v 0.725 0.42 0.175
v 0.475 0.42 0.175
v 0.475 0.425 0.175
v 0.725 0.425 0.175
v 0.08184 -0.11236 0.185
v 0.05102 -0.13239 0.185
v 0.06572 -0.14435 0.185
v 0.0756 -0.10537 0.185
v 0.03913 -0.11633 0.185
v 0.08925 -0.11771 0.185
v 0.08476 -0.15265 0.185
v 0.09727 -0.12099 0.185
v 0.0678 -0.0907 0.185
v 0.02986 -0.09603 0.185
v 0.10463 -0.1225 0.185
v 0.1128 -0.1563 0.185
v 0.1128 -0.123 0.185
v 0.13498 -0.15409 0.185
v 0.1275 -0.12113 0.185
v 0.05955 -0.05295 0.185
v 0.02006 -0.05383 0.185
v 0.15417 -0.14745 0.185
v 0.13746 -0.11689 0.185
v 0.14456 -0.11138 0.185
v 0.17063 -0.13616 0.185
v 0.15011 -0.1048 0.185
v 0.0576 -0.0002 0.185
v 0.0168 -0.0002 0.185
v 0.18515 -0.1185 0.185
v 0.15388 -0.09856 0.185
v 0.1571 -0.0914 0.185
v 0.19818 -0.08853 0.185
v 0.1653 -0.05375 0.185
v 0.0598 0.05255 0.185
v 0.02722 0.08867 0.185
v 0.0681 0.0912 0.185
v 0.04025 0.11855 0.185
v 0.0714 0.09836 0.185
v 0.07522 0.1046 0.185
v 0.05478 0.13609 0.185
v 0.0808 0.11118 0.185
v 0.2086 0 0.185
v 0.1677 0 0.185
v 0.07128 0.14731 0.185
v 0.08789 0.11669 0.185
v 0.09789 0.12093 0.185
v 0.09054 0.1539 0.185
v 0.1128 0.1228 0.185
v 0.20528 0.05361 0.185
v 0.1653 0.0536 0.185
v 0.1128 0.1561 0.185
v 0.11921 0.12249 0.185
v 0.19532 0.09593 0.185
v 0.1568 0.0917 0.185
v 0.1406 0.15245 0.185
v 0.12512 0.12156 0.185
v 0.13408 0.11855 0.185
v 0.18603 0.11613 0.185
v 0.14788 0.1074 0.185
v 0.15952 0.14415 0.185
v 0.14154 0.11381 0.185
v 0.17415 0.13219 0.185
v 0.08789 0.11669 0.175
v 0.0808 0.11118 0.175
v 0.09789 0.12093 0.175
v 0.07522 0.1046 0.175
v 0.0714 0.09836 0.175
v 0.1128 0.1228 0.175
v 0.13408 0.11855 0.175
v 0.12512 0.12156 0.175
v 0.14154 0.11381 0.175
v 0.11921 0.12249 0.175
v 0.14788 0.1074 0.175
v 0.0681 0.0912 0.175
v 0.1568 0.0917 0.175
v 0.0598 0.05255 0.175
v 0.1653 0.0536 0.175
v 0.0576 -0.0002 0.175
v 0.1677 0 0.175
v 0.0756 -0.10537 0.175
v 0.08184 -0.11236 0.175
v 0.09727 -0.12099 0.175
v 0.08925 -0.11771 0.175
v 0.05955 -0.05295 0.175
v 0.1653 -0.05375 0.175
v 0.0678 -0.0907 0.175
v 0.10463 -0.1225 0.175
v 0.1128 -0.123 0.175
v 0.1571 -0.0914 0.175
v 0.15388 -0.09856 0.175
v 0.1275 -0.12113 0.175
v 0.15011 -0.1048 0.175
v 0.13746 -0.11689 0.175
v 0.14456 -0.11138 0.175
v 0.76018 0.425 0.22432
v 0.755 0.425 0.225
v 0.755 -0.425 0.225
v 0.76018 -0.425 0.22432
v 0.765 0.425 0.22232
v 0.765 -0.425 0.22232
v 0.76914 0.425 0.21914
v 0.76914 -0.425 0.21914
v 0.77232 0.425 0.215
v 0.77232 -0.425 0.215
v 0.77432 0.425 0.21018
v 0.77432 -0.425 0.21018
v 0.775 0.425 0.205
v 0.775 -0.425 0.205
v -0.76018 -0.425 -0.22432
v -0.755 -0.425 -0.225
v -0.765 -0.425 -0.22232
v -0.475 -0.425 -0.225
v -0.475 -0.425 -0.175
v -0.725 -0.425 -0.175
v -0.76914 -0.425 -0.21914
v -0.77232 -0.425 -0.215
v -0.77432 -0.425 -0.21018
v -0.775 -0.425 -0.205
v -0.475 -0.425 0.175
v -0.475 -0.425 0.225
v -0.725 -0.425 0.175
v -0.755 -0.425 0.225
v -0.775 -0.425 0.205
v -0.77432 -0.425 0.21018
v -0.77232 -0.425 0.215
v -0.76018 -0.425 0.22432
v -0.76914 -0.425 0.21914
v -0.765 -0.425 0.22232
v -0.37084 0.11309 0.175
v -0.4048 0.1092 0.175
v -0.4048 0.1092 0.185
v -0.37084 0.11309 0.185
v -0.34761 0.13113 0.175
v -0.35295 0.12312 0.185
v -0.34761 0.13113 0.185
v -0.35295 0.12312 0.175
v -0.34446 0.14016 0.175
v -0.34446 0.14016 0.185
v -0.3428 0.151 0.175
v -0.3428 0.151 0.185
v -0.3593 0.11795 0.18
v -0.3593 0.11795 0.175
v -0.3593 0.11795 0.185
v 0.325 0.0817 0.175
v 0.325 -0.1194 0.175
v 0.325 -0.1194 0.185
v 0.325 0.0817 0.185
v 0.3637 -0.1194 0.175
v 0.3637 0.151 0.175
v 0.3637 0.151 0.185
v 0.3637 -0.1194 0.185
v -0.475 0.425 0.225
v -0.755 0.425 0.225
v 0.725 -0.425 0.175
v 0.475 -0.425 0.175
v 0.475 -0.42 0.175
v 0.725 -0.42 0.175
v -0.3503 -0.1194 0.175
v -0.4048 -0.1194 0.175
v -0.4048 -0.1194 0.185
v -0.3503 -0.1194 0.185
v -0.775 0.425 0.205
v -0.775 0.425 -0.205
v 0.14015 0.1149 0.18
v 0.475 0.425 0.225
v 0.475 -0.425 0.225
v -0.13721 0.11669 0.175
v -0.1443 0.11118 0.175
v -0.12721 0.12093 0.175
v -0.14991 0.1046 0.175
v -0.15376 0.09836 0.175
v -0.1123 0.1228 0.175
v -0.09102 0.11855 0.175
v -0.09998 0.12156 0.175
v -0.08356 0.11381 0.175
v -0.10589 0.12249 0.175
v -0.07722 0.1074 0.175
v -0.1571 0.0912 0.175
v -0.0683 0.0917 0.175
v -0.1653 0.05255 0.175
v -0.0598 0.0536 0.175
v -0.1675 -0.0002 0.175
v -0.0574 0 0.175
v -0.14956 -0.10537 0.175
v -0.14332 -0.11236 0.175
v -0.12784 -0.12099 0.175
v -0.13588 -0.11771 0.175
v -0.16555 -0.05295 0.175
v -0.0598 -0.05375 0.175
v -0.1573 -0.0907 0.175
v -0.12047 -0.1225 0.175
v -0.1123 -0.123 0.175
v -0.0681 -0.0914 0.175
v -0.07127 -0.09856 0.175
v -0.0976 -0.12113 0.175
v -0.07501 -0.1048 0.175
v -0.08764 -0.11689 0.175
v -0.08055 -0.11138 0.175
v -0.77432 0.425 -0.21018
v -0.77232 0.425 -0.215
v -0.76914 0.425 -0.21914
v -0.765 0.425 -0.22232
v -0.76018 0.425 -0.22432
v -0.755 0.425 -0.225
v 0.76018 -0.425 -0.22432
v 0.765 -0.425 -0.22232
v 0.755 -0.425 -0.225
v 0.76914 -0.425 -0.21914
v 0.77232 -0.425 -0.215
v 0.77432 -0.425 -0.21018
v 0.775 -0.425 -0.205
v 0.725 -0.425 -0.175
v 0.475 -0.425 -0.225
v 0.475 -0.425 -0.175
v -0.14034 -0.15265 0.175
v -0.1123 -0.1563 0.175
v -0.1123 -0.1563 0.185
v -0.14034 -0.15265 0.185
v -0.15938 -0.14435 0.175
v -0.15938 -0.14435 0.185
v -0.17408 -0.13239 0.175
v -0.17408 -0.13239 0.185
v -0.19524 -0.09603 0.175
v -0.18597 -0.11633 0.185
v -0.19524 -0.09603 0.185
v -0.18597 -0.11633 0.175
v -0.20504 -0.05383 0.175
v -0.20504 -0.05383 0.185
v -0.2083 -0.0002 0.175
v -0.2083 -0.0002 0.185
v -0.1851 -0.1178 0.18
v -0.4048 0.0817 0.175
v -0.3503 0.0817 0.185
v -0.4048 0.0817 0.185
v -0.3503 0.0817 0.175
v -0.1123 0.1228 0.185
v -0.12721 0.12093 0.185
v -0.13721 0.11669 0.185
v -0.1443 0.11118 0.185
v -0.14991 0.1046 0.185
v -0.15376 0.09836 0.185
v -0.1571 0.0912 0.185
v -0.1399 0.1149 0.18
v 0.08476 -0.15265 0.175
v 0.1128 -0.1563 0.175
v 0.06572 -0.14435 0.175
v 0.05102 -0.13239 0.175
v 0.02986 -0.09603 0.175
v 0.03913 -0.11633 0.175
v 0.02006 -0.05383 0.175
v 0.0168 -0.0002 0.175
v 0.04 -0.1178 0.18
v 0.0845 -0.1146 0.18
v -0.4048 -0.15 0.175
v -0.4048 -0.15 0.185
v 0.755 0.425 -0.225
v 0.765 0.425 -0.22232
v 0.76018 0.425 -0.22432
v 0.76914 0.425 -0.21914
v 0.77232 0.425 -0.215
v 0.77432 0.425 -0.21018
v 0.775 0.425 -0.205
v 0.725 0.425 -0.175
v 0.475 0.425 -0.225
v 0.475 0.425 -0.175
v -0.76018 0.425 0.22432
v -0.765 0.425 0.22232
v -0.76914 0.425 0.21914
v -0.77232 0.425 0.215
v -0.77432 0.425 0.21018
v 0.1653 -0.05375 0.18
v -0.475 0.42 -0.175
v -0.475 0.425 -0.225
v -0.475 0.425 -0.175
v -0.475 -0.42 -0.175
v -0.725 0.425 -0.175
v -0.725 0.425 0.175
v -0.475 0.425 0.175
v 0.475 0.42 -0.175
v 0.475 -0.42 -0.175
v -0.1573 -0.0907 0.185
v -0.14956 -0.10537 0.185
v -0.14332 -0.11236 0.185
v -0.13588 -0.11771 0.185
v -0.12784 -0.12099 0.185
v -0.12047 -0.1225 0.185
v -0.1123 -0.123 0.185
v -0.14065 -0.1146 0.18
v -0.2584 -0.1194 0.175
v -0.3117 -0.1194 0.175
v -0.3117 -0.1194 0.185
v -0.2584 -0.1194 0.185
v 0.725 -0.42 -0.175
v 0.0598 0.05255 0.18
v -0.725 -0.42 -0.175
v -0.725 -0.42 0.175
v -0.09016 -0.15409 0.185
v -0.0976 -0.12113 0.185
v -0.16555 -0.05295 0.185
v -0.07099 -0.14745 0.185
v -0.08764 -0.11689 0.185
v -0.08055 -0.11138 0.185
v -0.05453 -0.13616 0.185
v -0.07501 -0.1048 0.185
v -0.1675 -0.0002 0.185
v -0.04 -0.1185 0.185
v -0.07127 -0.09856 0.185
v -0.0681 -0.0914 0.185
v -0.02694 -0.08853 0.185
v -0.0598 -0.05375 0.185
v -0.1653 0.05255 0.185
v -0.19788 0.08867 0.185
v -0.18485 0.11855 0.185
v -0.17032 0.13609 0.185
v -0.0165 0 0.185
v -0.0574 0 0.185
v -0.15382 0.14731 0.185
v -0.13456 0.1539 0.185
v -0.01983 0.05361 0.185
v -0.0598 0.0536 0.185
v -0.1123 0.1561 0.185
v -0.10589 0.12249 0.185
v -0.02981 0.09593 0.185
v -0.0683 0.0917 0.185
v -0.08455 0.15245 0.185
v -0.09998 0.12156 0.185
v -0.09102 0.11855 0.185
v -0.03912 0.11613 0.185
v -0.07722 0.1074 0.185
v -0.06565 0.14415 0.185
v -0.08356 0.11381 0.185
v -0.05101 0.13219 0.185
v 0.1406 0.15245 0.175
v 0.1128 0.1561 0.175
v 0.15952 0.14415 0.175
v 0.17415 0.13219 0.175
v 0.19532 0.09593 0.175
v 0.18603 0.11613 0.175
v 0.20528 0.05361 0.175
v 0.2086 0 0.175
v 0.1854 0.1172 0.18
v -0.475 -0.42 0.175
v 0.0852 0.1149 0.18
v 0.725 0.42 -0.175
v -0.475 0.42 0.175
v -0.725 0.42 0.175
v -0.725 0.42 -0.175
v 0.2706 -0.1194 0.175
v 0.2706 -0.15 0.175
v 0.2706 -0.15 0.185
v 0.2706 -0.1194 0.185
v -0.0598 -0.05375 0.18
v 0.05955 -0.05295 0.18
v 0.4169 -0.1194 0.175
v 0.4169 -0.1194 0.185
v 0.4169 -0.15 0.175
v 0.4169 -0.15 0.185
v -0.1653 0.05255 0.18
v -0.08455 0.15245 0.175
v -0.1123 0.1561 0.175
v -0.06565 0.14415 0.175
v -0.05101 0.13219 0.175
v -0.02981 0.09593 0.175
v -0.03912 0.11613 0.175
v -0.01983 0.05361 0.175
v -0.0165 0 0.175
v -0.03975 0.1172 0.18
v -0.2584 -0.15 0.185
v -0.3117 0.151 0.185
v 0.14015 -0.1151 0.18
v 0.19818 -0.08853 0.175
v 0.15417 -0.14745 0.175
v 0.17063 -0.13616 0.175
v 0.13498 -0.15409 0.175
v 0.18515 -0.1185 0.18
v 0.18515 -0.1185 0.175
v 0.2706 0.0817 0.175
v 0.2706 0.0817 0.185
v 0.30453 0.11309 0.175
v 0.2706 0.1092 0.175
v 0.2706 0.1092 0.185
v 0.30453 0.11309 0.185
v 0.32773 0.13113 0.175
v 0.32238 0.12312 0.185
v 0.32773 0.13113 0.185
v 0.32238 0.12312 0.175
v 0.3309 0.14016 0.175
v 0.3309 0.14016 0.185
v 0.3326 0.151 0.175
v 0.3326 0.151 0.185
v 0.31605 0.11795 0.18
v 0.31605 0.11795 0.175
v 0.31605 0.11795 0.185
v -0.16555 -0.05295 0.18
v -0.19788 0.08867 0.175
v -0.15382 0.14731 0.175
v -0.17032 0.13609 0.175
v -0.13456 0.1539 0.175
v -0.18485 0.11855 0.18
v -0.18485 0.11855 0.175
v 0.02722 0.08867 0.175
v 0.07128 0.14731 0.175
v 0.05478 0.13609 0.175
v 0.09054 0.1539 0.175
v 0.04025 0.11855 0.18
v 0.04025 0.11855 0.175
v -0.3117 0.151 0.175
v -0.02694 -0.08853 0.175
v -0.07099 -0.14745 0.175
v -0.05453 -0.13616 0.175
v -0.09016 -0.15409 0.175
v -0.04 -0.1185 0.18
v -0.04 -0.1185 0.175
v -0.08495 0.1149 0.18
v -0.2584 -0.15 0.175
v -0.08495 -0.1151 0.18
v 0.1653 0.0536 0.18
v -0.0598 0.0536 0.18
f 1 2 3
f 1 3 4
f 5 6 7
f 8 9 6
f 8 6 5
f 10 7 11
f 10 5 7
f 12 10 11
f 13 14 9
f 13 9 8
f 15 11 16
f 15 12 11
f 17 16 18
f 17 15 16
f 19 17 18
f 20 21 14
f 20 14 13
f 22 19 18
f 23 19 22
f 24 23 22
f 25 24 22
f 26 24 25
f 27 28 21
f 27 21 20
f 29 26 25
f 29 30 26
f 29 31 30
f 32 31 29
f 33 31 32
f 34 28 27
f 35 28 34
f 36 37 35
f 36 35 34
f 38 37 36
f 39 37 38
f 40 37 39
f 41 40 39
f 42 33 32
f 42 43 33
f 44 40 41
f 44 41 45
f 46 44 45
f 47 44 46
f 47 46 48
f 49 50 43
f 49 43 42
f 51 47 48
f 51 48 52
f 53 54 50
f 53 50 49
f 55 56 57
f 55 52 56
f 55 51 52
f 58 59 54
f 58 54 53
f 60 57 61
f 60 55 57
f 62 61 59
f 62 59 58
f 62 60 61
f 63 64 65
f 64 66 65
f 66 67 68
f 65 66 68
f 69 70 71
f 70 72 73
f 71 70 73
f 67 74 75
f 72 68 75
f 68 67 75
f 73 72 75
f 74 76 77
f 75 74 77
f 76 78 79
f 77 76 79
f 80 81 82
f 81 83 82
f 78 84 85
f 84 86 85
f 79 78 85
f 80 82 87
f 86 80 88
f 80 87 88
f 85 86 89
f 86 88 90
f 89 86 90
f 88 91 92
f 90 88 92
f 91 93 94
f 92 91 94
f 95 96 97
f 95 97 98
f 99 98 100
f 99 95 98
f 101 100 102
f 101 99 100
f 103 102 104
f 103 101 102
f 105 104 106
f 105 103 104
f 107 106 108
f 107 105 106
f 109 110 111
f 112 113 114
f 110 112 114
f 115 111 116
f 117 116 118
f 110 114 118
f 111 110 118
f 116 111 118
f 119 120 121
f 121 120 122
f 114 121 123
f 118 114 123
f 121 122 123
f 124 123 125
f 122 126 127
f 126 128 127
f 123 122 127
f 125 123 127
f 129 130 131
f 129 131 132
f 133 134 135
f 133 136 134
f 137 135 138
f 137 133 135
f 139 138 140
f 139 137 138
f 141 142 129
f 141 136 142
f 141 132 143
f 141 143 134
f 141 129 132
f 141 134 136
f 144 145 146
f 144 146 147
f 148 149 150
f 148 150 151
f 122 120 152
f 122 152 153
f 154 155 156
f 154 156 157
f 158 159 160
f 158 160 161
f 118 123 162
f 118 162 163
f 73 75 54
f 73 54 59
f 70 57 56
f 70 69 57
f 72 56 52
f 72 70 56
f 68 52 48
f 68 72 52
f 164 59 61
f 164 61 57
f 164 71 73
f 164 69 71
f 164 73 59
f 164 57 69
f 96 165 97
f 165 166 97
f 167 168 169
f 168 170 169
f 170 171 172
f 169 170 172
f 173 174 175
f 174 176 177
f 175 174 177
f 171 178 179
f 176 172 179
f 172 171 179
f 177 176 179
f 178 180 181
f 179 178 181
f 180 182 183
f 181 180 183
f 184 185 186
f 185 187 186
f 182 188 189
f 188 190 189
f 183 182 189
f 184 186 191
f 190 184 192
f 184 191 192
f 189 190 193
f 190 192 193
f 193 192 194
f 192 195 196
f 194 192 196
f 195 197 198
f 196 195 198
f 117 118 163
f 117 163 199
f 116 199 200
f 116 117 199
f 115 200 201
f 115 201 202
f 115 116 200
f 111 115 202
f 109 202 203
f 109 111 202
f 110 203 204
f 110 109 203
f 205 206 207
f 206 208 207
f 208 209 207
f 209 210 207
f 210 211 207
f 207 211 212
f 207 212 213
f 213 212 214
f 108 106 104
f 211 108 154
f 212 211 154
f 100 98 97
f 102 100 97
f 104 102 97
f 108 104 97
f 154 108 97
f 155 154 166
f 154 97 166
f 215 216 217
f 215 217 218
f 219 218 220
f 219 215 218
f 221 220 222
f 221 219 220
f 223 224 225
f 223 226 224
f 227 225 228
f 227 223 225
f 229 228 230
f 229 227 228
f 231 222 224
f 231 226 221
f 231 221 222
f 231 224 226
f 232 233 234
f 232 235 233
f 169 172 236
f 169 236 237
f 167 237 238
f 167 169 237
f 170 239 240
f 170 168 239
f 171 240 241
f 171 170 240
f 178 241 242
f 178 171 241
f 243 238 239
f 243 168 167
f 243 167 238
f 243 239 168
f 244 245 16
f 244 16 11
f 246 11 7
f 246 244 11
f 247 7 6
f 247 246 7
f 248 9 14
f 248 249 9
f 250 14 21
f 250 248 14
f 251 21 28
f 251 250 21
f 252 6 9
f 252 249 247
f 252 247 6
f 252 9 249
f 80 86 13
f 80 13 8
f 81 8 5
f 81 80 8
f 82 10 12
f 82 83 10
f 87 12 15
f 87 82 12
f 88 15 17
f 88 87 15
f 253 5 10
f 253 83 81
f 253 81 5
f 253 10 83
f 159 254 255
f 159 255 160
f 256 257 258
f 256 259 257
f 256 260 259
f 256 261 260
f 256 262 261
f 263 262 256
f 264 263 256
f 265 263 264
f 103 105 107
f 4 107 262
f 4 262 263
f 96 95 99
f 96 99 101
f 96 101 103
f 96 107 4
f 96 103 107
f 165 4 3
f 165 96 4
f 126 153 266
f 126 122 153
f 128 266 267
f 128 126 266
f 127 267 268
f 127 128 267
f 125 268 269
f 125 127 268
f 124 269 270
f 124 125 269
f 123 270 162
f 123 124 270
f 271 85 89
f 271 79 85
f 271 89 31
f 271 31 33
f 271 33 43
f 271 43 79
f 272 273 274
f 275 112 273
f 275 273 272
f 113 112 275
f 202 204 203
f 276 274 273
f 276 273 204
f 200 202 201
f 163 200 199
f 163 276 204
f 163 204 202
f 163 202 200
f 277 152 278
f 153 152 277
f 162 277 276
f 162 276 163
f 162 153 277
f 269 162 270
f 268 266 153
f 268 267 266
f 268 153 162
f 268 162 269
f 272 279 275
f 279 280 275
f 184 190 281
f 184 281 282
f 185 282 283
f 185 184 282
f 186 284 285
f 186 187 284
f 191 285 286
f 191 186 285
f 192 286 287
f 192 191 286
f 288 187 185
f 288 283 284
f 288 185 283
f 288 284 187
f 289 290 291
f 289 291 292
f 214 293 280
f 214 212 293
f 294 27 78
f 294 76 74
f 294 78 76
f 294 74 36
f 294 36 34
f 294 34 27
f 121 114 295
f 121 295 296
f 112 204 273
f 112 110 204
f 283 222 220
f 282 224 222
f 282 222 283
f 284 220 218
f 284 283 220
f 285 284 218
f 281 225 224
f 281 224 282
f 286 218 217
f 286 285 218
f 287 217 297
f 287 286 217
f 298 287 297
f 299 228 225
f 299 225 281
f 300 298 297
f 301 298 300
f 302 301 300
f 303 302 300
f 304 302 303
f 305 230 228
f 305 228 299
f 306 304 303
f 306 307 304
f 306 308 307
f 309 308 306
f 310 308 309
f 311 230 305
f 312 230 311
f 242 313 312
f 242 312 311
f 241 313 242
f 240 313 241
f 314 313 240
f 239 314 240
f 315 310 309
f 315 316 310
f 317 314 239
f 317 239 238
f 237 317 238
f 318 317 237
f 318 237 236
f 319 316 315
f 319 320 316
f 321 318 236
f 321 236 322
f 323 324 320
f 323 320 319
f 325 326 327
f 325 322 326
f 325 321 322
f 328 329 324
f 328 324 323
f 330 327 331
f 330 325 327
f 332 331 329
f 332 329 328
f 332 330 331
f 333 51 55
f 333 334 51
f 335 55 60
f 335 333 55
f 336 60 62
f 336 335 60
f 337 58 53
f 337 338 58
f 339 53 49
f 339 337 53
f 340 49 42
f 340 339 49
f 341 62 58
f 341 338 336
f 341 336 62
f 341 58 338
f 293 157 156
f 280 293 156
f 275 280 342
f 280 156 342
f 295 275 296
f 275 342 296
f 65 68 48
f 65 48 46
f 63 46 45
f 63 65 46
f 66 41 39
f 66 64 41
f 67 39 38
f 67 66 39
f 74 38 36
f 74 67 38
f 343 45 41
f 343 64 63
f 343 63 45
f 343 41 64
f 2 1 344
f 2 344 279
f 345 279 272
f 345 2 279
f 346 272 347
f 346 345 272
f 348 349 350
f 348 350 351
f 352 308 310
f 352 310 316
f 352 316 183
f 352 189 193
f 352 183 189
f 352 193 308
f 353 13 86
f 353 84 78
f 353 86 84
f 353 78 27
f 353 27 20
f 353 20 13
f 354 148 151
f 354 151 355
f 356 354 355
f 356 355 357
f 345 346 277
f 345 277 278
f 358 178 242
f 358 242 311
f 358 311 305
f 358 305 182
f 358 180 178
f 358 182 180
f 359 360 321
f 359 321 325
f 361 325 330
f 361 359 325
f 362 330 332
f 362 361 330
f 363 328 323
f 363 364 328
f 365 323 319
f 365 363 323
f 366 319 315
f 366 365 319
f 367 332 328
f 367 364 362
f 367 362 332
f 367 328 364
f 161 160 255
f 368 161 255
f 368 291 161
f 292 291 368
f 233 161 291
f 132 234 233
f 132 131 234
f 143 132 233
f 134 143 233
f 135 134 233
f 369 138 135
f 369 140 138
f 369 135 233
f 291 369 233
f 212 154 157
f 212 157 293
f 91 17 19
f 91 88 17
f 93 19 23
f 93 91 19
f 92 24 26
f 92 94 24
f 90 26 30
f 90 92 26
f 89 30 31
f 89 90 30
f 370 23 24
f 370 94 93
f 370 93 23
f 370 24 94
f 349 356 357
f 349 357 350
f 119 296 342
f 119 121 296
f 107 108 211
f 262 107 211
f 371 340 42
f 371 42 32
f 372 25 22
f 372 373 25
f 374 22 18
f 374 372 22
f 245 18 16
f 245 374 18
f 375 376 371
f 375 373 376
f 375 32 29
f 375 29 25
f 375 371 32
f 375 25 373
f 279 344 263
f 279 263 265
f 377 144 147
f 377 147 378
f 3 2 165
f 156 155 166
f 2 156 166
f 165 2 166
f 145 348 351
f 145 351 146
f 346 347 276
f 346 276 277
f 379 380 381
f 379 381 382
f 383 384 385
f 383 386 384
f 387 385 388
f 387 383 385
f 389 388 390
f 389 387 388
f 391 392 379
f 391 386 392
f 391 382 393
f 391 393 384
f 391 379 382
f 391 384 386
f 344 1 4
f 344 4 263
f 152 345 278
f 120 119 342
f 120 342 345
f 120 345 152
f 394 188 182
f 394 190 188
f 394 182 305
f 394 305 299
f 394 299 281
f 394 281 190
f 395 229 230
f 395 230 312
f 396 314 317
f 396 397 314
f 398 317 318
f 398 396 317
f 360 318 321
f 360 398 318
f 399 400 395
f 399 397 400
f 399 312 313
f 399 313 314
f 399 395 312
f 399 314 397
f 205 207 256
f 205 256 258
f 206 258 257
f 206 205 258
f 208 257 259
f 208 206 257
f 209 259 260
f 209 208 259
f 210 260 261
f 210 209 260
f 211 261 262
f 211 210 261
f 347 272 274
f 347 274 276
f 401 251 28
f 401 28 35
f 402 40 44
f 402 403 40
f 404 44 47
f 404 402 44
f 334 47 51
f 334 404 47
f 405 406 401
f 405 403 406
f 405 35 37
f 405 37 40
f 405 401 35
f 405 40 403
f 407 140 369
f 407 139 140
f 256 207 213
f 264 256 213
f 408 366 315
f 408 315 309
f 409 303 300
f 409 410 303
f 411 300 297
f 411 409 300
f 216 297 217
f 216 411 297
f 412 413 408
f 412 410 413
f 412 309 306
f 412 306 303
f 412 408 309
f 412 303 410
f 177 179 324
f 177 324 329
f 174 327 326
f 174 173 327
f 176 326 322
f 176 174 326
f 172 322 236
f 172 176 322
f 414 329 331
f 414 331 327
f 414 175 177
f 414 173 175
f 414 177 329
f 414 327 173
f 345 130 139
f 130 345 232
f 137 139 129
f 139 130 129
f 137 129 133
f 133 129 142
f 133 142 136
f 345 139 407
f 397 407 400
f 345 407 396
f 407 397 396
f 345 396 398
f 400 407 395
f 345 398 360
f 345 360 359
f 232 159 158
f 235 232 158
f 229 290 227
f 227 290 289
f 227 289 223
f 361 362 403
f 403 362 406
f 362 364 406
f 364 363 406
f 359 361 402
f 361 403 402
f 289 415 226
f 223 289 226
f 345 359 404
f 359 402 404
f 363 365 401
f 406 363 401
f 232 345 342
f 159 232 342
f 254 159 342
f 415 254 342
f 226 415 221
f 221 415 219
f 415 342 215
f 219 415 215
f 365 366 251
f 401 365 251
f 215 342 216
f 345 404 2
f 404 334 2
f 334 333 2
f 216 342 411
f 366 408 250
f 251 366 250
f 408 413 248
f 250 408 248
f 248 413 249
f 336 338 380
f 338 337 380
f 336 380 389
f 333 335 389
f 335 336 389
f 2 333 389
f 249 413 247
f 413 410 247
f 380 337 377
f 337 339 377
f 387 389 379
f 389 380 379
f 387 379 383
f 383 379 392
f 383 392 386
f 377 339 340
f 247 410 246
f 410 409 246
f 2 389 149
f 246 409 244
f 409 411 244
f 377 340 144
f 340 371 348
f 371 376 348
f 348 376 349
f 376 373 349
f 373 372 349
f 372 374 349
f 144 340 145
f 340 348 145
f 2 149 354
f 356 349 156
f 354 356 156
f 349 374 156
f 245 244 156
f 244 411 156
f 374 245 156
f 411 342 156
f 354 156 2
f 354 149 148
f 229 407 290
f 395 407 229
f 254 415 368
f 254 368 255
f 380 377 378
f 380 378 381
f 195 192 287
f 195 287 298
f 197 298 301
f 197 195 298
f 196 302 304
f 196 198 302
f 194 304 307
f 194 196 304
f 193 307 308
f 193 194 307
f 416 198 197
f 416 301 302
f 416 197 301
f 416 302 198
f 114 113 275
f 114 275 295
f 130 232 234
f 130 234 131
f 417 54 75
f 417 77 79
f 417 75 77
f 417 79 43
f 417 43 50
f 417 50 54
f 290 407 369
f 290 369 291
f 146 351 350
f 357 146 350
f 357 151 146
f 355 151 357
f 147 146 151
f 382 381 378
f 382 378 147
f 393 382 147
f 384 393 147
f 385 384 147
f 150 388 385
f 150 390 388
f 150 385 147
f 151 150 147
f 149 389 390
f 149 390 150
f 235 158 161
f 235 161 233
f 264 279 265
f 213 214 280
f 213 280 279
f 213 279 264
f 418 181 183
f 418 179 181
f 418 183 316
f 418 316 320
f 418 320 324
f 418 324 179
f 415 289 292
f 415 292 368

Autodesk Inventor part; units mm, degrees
ref_plane "YZ Plane" through (0, 0, 0) normal (1, 0, 0) x (0, 1, 0)
ref_plane "XZ Plane" through (0, 0, 0) normal (0, 1, 0) x (-1, 0, 0)
ref_plane "XY Plane" through (0, 0, 0) normal (0, 0, 1) x (1, 0, 0)
sketch "Sketch1" plane through (0, 0, 0) normal (0, 1, 0) x (-1, 0, 0)
  line L0 (0.725, 0.175) -> (-0.725, 0.175)
  line L1 (-0.725, 0.175) -> (-0.725, -0.175)
  line L2 (-0.725, -0.175) -> (0.725, -0.175)
  line L3 (0.725, -0.175) -> (0.725, 0.175)
  line L4 (0.475, 0.175) -> (0.475, 0.225)
  line L5 (0.475, 0.225) -> (0.775, 0.225)
  line L6 (0.775, 0.225) -> (0.775, -0.225)
  line L7 (0.775, -0.225) -> (0.475, -0.225)
  line L8 (0.475, -0.225) -> (0.475, -0.175)
  line L9 (-0.475, 0.175) -> (-0.475, 0.225)
  line L10 (-0.475, 0.225) -> (-0.775, 0.225)
  line L11 (-0.775, 0.225) -> (-0.775, -0.225)
  line L12 (-0.775, -0.225) -> (-0.475, -0.225)
  line L13 (-0.475, -0.175) -> (-0.475, -0.225)
  line L14 (0.475, 0.175) -> (-0.475, 0.175)
  point P0 (0, 0)
  point P1 (0, 0.175)
  point P2 (0.725, 0)
  dimension "d0" = 1.55
  dimension "d1" = 0.05
  dimension "d2" = 0.05
  dimension "d3" = 0.45
  dimension "d4" = 0.3
extrude "Extrusion1" add sketch "Sketch1" along normal mid plane 0.85 contours L0 L4 L5 L6 L7 L8 L2 L3 | L0 L1 L2 L13 L12 L11 L10 L9
extrude "Extrusion2" add sketch "Sketch1" along normal mid plane 0.84 contours L3 L2 L1 L0
sketch "Sketch2" plane through (-0.475, -0.42, 0.175) normal (0, 0, 1) x (1, 0, 0)
  line L0 (0, 0) -> (0, 0.84) projected
  line L1 (0.95, 0) -> (0, 0) projected
  line L2 (0.95, 0) -> (0.95, 0.84) projected
  line L3 (0, 0.84) -> (0.95, 0.84) projected
  line L4 (0, 0.42) -> (0.95, 0.42) construction
  line L5 (0.2166, 0.27) -> (0.0702, 0.27)
  line L6 (0.0702, 0.27) -> (0.0702, 0.3006)
  line L7 (0.0702, 0.3006) -> (0.1247, 0.3006)
  line L8 (0.1247, 0.3006) -> (0.1247, 0.5017)
  line L9 (0.1247, 0.5017) -> (0.0702, 0.5017)
  line L10 (0.0702, 0.5017) -> (0.0702, 0.5292)
  spline S0 degree 2 poles (0.0702, 0.5292) (0.1011, 0.5292) (0.1303, 0.5467) (0.1322, 0.571) knots 0 0 0 1 2 2 2
  line L11 (0.1322, 0.571) -> (0.1633, 0.571)
  line L12 (0.1633, 0.571) -> (0.1633, 0.3006)
  line L13 (0.1633, 0.3006) -> (0.2166, 0.3006)
  line L14 (0.2166, 0.3006) -> (0.2166, 0.27)
  spline S1 degree 2 poles (0.4585, 0.42) (0.4585, 0.3393) (0.4115, 0.2637) (0.3627, 0.2637) knots 0 0 0 1 2 2 2
  spline S2 degree 2 poles (0.3627, 0.2637) (0.3131, 0.2637) (0.2667, 0.3407) (0.2667, 0.4198) knots 0 0 0 1 2 2 2
  spline S3 degree 2 poles (0.2667, 0.4198) (0.2667, 0.501) (0.3136, 0.5761) (0.3627, 0.5761) knots 0 0 0 1 2 2 2
  spline S4 degree 2 poles (0.3627, 0.5761) (0.412, 0.5761) (0.4585, 0.4983) (0.4585, 0.42) knots 0 0 0 1 2 2 2
  spline S5 degree 2 poles (0.4069, 0.3286) (0.4128, 0.3434) (0.4176, 0.3891) (0.4176, 0.42) knots 0 0 0 1 2 2 2
  spline S6 degree 2 poles (0.4176, 0.42) (0.4176, 0.4509) (0.4128, 0.4963) (0.4067, 0.5117) knots 0 0 0 1 2 2 2
  spline S7 degree 2 poles (0.4067, 0.5117) (0.4006, 0.527) (0.3795, 0.5428) (0.3627, 0.5428) knots 0 0 0 1 2 2 2
  spline S8 degree 2 poles (0.3627, 0.5428) (0.3459, 0.5428) (0.3243, 0.527) (0.3179, 0.5112) knots 0 0 0 1 2 2 2
  spline S9 degree 2 poles (0.3179, 0.5112) (0.3119, 0.4959) (0.3075, 0.4492) (0.3075, 0.4198) knots 0 0 0 1 2 2 2
  spline S10 degree 2 poles (0.3075, 0.4198) (0.3075, 0.3882) (0.3114, 0.3459) (0.3177, 0.3293) knots 0 0 0 1 2 2 2
  spline S11 degree 2 poles (0.3177, 0.3293) (0.3235, 0.3138) (0.3452, 0.297) (0.3627, 0.297) knots 0 0 0 1 2 2 2
  spline S12 degree 2 poles (0.3627, 0.297) (0.3792, 0.297) (0.4009, 0.3128) (0.4069, 0.3286) knots 0 0 0 1 2 2 2
  spline S13 degree 2 poles (0.6836, 0.42) (0.6836, 0.3393) (0.6367, 0.2637) (0.5878, 0.2637) knots 0 0 0 1 2 2 2
  spline S14 degree 2 poles (0.5878, 0.2637) (0.5382, 0.2637) (0.4918, 0.3407) (0.4918, 0.4198) knots 0 0 0 1 2 2 2
  spline S15 degree 2 poles (0.4918, 0.4198) (0.4918, 0.501) (0.5387, 0.5761) (0.5878, 0.5761) knots 0 0 0 1 2 2 2
  spline S16 degree 2 poles (0.5878, 0.5761) (0.6372, 0.5761) (0.6836, 0.4983) (0.6836, 0.42) knots 0 0 0 1 2 2 2
  spline S17 degree 2 poles (0.6321, 0.3286) (0.6379, 0.3434) (0.6427, 0.3891) (0.6427, 0.42) knots 0 0 0 1 2 2 2
  spline S18 degree 2 poles (0.6427, 0.42) (0.6427, 0.4509) (0.6379, 0.4963) (0.6318, 0.5117) knots 0 0 0 1 2 2 2
  spline S19 degree 2 poles (0.6318, 0.5117) (0.6257, 0.527) (0.6046, 0.5428) (0.5878, 0.5428) knots 0 0 0 1 2 2 2
  spline S20 degree 2 poles (0.5878, 0.5428) (0.571, 0.5428) (0.5494, 0.527) (0.5431, 0.5112) knots 0 0 0 1 2 2 2
  spline S21 degree 2 poles (0.5431, 0.5112) (0.537, 0.4959) (0.5326, 0.4492) (0.5326, 0.4198) knots 0 0 0 1 2 2 2
  spline S22 degree 2 poles (0.5326, 0.4198) (0.5326, 0.3882) (0.5365, 0.3459) (0.5428, 0.3293) knots 0 0 0 1 2 2 2
  spline S23 degree 2 poles (0.5428, 0.3293) (0.5487, 0.3138) (0.5703, 0.297) (0.5878, 0.297) knots 0 0 0 1 2 2 2
  spline S24 degree 2 poles (0.5878, 0.297) (0.6043, 0.297) (0.626, 0.3128) (0.6321, 0.3286) knots 0 0 0 1 2 2 2
  line L15 (0.8919, 0.27) -> (0.7456, 0.27)
  line L16 (0.7456, 0.27) -> (0.7456, 0.3006)
  line L17 (0.7456, 0.3006) -> (0.8, 0.3006)
  line L18 (0.8, 0.3006) -> (0.8, 0.5017)
  line L19 (0.8, 0.5017) -> (0.7456, 0.5017)
  line L20 (0.7456, 0.5017) -> (0.7456, 0.5292)
  spline S25 degree 2 poles (0.7456, 0.5292) (0.7765, 0.5292) (0.8056, 0.5467) (0.8076, 0.571) knots 0 0 0 1 2 2 2
  line L21 (0.8076, 0.571) -> (0.8387, 0.571)
  line L22 (0.8387, 0.571) -> (0.8387, 0.3006)
  line L23 (0.8387, 0.3006) -> (0.8919, 0.3006)
  line L24 (0.8919, 0.3006) -> (0.8919, 0.27)
  point P0 (0.475, 0.42)
extrude "Extrusion3" add sketch "Sketch2" along normal blind 0.01 contours L5 L6 L7 L8 L9 L10 S0 L11 L12 L13 L14 | S1 S2 S3 S4 | S13 S14 S15 S16 | L15 L16 L17 L18 L19 L20 S25 L21 L22 L23 L24
fillet "Fillet1" radius 0.02 4 edges at (-0.775, 0, 0.225) (-0.775, 0, -0.225) (0.775, 0, 0.225) (0.775, 0, -0.225)
equation "\"d2\" = d1"
properties part number "21-1001" material "Copper"
